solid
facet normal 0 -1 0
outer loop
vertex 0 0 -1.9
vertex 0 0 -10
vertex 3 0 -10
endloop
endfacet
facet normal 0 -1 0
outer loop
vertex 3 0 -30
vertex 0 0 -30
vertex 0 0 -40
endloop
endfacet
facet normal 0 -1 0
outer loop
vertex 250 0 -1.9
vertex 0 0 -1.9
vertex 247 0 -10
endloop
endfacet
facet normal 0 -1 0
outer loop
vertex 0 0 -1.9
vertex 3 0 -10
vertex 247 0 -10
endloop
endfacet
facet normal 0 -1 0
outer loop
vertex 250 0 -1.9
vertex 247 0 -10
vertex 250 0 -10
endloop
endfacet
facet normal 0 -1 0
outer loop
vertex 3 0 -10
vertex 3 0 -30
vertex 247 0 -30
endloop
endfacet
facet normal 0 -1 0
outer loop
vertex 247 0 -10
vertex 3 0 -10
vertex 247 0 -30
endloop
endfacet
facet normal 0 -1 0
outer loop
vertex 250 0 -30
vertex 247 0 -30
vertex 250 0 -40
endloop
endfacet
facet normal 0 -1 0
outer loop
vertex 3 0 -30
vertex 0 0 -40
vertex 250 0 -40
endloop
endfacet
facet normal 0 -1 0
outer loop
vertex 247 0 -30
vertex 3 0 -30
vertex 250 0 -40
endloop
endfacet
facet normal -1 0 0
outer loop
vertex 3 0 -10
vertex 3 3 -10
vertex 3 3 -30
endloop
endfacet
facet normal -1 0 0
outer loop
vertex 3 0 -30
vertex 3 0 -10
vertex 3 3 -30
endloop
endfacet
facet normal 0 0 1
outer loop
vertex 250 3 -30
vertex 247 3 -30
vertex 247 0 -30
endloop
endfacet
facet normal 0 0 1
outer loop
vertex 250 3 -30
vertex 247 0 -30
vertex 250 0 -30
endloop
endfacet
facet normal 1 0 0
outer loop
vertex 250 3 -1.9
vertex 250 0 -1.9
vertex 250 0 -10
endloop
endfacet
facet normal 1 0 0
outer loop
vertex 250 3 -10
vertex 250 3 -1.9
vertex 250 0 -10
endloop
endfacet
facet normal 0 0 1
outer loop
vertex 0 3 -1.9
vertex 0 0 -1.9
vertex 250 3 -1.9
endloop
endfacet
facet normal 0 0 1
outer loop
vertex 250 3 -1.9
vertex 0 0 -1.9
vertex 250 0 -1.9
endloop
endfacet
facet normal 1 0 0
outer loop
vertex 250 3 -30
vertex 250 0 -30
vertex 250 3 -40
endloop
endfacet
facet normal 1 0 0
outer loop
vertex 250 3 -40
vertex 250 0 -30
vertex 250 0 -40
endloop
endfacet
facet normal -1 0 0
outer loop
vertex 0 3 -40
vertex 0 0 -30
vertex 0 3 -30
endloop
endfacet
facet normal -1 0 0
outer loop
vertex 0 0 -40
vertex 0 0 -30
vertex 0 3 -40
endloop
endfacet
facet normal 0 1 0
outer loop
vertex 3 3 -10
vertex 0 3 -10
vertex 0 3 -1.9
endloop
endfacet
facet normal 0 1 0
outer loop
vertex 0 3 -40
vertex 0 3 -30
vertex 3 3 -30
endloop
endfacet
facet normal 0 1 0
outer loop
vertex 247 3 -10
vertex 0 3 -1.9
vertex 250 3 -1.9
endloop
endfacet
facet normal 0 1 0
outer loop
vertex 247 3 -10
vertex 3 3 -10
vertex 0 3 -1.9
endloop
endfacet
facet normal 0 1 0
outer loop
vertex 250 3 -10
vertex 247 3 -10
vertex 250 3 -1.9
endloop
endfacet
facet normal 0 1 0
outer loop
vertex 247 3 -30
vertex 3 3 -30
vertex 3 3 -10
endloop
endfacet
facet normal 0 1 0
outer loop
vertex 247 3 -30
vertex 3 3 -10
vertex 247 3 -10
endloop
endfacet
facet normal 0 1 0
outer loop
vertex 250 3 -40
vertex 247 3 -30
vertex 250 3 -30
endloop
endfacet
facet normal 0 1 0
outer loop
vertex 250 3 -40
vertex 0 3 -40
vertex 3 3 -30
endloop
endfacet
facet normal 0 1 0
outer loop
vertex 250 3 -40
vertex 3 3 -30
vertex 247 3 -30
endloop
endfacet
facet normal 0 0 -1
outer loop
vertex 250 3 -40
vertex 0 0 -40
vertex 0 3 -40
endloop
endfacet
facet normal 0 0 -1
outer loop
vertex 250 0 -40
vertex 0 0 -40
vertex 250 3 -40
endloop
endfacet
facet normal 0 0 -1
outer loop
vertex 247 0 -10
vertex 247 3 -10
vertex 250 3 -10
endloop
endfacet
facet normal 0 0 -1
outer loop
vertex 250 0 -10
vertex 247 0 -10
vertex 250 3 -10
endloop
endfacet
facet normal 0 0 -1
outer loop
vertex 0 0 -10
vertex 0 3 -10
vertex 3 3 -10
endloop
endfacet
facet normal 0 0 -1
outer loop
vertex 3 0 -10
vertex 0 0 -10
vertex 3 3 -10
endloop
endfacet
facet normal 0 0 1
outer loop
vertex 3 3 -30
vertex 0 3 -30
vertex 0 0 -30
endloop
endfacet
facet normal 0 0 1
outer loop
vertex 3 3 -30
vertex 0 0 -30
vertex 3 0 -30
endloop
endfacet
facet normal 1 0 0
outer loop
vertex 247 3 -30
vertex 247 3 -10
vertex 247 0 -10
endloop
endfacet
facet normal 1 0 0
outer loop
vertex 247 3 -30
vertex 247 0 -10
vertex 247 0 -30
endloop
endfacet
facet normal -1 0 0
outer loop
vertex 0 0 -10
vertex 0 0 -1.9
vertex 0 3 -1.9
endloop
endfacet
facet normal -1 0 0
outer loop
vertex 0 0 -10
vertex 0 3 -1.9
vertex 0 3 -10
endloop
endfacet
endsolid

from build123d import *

# Parameters (mm, degrees)
SKETCH1_W           = 250
SKETCH1_H           = 40
BOSS_EXTRUDE1_DEPTH = 3
SKETCH2_W           = 3
SKETCH2_H           = 20
CUT_EXTRUDE1_DEPTH  = 254.197551331
CUT_EXTRUDE2_REACH  = 255.198
SKETCH4_W           = 250
SKETCH4_H           = 1.9


with BuildPart() as part:
    # Sketch1 → Boss-Extrude1 (new body)
    with BuildSketch(Plane(origin=(0, 0, 0), x_dir=(1, 0, 0), z_dir=(0, 1, 0))):
        with Locations((125, 20)):
            Rectangle(SKETCH1_W, SKETCH1_H)
    extrude(amount=BOSS_EXTRUDE1_DEPTH)

    # Sketch2 → Cut-Extrude1 (cut, through all)
    with BuildSketch(Plane(origin=(0, 3, 0), x_dir=(1, 0, 0), z_dir=(0, 1, 0))):
        with Locations((1.5, 20)):
            Rectangle(SKETCH2_W, SKETCH2_H)
        with Locations((248.5, 20)):
            Rectangle(SKETCH2_W, SKETCH2_H)
    extrude(amount=-CUT_EXTRUDE1_DEPTH, mode=Mode.SUBTRACT)

    # Sketch4 → Cut-Extrude2 (cut, up to next)
    with BuildSketch(Plane.XZ, mode=Mode.PRIVATE) as cut_extrude2_sk1:
        with Locations((125, -0.95)):
            Rectangle(SKETCH4_W, SKETCH4_H)
    cut_extrude2_tool1 = extrude(cut_extrude2_sk1.sketch, amount=-CUT_EXTRUDE2_REACH, mode=Mode.PRIVATE) & part.part
    add(cut_extrude2_tool1.solids().sort_by_distance((125, 0, -0.95))[0], mode=Mode.SUBTRACT)


solid = part.part
